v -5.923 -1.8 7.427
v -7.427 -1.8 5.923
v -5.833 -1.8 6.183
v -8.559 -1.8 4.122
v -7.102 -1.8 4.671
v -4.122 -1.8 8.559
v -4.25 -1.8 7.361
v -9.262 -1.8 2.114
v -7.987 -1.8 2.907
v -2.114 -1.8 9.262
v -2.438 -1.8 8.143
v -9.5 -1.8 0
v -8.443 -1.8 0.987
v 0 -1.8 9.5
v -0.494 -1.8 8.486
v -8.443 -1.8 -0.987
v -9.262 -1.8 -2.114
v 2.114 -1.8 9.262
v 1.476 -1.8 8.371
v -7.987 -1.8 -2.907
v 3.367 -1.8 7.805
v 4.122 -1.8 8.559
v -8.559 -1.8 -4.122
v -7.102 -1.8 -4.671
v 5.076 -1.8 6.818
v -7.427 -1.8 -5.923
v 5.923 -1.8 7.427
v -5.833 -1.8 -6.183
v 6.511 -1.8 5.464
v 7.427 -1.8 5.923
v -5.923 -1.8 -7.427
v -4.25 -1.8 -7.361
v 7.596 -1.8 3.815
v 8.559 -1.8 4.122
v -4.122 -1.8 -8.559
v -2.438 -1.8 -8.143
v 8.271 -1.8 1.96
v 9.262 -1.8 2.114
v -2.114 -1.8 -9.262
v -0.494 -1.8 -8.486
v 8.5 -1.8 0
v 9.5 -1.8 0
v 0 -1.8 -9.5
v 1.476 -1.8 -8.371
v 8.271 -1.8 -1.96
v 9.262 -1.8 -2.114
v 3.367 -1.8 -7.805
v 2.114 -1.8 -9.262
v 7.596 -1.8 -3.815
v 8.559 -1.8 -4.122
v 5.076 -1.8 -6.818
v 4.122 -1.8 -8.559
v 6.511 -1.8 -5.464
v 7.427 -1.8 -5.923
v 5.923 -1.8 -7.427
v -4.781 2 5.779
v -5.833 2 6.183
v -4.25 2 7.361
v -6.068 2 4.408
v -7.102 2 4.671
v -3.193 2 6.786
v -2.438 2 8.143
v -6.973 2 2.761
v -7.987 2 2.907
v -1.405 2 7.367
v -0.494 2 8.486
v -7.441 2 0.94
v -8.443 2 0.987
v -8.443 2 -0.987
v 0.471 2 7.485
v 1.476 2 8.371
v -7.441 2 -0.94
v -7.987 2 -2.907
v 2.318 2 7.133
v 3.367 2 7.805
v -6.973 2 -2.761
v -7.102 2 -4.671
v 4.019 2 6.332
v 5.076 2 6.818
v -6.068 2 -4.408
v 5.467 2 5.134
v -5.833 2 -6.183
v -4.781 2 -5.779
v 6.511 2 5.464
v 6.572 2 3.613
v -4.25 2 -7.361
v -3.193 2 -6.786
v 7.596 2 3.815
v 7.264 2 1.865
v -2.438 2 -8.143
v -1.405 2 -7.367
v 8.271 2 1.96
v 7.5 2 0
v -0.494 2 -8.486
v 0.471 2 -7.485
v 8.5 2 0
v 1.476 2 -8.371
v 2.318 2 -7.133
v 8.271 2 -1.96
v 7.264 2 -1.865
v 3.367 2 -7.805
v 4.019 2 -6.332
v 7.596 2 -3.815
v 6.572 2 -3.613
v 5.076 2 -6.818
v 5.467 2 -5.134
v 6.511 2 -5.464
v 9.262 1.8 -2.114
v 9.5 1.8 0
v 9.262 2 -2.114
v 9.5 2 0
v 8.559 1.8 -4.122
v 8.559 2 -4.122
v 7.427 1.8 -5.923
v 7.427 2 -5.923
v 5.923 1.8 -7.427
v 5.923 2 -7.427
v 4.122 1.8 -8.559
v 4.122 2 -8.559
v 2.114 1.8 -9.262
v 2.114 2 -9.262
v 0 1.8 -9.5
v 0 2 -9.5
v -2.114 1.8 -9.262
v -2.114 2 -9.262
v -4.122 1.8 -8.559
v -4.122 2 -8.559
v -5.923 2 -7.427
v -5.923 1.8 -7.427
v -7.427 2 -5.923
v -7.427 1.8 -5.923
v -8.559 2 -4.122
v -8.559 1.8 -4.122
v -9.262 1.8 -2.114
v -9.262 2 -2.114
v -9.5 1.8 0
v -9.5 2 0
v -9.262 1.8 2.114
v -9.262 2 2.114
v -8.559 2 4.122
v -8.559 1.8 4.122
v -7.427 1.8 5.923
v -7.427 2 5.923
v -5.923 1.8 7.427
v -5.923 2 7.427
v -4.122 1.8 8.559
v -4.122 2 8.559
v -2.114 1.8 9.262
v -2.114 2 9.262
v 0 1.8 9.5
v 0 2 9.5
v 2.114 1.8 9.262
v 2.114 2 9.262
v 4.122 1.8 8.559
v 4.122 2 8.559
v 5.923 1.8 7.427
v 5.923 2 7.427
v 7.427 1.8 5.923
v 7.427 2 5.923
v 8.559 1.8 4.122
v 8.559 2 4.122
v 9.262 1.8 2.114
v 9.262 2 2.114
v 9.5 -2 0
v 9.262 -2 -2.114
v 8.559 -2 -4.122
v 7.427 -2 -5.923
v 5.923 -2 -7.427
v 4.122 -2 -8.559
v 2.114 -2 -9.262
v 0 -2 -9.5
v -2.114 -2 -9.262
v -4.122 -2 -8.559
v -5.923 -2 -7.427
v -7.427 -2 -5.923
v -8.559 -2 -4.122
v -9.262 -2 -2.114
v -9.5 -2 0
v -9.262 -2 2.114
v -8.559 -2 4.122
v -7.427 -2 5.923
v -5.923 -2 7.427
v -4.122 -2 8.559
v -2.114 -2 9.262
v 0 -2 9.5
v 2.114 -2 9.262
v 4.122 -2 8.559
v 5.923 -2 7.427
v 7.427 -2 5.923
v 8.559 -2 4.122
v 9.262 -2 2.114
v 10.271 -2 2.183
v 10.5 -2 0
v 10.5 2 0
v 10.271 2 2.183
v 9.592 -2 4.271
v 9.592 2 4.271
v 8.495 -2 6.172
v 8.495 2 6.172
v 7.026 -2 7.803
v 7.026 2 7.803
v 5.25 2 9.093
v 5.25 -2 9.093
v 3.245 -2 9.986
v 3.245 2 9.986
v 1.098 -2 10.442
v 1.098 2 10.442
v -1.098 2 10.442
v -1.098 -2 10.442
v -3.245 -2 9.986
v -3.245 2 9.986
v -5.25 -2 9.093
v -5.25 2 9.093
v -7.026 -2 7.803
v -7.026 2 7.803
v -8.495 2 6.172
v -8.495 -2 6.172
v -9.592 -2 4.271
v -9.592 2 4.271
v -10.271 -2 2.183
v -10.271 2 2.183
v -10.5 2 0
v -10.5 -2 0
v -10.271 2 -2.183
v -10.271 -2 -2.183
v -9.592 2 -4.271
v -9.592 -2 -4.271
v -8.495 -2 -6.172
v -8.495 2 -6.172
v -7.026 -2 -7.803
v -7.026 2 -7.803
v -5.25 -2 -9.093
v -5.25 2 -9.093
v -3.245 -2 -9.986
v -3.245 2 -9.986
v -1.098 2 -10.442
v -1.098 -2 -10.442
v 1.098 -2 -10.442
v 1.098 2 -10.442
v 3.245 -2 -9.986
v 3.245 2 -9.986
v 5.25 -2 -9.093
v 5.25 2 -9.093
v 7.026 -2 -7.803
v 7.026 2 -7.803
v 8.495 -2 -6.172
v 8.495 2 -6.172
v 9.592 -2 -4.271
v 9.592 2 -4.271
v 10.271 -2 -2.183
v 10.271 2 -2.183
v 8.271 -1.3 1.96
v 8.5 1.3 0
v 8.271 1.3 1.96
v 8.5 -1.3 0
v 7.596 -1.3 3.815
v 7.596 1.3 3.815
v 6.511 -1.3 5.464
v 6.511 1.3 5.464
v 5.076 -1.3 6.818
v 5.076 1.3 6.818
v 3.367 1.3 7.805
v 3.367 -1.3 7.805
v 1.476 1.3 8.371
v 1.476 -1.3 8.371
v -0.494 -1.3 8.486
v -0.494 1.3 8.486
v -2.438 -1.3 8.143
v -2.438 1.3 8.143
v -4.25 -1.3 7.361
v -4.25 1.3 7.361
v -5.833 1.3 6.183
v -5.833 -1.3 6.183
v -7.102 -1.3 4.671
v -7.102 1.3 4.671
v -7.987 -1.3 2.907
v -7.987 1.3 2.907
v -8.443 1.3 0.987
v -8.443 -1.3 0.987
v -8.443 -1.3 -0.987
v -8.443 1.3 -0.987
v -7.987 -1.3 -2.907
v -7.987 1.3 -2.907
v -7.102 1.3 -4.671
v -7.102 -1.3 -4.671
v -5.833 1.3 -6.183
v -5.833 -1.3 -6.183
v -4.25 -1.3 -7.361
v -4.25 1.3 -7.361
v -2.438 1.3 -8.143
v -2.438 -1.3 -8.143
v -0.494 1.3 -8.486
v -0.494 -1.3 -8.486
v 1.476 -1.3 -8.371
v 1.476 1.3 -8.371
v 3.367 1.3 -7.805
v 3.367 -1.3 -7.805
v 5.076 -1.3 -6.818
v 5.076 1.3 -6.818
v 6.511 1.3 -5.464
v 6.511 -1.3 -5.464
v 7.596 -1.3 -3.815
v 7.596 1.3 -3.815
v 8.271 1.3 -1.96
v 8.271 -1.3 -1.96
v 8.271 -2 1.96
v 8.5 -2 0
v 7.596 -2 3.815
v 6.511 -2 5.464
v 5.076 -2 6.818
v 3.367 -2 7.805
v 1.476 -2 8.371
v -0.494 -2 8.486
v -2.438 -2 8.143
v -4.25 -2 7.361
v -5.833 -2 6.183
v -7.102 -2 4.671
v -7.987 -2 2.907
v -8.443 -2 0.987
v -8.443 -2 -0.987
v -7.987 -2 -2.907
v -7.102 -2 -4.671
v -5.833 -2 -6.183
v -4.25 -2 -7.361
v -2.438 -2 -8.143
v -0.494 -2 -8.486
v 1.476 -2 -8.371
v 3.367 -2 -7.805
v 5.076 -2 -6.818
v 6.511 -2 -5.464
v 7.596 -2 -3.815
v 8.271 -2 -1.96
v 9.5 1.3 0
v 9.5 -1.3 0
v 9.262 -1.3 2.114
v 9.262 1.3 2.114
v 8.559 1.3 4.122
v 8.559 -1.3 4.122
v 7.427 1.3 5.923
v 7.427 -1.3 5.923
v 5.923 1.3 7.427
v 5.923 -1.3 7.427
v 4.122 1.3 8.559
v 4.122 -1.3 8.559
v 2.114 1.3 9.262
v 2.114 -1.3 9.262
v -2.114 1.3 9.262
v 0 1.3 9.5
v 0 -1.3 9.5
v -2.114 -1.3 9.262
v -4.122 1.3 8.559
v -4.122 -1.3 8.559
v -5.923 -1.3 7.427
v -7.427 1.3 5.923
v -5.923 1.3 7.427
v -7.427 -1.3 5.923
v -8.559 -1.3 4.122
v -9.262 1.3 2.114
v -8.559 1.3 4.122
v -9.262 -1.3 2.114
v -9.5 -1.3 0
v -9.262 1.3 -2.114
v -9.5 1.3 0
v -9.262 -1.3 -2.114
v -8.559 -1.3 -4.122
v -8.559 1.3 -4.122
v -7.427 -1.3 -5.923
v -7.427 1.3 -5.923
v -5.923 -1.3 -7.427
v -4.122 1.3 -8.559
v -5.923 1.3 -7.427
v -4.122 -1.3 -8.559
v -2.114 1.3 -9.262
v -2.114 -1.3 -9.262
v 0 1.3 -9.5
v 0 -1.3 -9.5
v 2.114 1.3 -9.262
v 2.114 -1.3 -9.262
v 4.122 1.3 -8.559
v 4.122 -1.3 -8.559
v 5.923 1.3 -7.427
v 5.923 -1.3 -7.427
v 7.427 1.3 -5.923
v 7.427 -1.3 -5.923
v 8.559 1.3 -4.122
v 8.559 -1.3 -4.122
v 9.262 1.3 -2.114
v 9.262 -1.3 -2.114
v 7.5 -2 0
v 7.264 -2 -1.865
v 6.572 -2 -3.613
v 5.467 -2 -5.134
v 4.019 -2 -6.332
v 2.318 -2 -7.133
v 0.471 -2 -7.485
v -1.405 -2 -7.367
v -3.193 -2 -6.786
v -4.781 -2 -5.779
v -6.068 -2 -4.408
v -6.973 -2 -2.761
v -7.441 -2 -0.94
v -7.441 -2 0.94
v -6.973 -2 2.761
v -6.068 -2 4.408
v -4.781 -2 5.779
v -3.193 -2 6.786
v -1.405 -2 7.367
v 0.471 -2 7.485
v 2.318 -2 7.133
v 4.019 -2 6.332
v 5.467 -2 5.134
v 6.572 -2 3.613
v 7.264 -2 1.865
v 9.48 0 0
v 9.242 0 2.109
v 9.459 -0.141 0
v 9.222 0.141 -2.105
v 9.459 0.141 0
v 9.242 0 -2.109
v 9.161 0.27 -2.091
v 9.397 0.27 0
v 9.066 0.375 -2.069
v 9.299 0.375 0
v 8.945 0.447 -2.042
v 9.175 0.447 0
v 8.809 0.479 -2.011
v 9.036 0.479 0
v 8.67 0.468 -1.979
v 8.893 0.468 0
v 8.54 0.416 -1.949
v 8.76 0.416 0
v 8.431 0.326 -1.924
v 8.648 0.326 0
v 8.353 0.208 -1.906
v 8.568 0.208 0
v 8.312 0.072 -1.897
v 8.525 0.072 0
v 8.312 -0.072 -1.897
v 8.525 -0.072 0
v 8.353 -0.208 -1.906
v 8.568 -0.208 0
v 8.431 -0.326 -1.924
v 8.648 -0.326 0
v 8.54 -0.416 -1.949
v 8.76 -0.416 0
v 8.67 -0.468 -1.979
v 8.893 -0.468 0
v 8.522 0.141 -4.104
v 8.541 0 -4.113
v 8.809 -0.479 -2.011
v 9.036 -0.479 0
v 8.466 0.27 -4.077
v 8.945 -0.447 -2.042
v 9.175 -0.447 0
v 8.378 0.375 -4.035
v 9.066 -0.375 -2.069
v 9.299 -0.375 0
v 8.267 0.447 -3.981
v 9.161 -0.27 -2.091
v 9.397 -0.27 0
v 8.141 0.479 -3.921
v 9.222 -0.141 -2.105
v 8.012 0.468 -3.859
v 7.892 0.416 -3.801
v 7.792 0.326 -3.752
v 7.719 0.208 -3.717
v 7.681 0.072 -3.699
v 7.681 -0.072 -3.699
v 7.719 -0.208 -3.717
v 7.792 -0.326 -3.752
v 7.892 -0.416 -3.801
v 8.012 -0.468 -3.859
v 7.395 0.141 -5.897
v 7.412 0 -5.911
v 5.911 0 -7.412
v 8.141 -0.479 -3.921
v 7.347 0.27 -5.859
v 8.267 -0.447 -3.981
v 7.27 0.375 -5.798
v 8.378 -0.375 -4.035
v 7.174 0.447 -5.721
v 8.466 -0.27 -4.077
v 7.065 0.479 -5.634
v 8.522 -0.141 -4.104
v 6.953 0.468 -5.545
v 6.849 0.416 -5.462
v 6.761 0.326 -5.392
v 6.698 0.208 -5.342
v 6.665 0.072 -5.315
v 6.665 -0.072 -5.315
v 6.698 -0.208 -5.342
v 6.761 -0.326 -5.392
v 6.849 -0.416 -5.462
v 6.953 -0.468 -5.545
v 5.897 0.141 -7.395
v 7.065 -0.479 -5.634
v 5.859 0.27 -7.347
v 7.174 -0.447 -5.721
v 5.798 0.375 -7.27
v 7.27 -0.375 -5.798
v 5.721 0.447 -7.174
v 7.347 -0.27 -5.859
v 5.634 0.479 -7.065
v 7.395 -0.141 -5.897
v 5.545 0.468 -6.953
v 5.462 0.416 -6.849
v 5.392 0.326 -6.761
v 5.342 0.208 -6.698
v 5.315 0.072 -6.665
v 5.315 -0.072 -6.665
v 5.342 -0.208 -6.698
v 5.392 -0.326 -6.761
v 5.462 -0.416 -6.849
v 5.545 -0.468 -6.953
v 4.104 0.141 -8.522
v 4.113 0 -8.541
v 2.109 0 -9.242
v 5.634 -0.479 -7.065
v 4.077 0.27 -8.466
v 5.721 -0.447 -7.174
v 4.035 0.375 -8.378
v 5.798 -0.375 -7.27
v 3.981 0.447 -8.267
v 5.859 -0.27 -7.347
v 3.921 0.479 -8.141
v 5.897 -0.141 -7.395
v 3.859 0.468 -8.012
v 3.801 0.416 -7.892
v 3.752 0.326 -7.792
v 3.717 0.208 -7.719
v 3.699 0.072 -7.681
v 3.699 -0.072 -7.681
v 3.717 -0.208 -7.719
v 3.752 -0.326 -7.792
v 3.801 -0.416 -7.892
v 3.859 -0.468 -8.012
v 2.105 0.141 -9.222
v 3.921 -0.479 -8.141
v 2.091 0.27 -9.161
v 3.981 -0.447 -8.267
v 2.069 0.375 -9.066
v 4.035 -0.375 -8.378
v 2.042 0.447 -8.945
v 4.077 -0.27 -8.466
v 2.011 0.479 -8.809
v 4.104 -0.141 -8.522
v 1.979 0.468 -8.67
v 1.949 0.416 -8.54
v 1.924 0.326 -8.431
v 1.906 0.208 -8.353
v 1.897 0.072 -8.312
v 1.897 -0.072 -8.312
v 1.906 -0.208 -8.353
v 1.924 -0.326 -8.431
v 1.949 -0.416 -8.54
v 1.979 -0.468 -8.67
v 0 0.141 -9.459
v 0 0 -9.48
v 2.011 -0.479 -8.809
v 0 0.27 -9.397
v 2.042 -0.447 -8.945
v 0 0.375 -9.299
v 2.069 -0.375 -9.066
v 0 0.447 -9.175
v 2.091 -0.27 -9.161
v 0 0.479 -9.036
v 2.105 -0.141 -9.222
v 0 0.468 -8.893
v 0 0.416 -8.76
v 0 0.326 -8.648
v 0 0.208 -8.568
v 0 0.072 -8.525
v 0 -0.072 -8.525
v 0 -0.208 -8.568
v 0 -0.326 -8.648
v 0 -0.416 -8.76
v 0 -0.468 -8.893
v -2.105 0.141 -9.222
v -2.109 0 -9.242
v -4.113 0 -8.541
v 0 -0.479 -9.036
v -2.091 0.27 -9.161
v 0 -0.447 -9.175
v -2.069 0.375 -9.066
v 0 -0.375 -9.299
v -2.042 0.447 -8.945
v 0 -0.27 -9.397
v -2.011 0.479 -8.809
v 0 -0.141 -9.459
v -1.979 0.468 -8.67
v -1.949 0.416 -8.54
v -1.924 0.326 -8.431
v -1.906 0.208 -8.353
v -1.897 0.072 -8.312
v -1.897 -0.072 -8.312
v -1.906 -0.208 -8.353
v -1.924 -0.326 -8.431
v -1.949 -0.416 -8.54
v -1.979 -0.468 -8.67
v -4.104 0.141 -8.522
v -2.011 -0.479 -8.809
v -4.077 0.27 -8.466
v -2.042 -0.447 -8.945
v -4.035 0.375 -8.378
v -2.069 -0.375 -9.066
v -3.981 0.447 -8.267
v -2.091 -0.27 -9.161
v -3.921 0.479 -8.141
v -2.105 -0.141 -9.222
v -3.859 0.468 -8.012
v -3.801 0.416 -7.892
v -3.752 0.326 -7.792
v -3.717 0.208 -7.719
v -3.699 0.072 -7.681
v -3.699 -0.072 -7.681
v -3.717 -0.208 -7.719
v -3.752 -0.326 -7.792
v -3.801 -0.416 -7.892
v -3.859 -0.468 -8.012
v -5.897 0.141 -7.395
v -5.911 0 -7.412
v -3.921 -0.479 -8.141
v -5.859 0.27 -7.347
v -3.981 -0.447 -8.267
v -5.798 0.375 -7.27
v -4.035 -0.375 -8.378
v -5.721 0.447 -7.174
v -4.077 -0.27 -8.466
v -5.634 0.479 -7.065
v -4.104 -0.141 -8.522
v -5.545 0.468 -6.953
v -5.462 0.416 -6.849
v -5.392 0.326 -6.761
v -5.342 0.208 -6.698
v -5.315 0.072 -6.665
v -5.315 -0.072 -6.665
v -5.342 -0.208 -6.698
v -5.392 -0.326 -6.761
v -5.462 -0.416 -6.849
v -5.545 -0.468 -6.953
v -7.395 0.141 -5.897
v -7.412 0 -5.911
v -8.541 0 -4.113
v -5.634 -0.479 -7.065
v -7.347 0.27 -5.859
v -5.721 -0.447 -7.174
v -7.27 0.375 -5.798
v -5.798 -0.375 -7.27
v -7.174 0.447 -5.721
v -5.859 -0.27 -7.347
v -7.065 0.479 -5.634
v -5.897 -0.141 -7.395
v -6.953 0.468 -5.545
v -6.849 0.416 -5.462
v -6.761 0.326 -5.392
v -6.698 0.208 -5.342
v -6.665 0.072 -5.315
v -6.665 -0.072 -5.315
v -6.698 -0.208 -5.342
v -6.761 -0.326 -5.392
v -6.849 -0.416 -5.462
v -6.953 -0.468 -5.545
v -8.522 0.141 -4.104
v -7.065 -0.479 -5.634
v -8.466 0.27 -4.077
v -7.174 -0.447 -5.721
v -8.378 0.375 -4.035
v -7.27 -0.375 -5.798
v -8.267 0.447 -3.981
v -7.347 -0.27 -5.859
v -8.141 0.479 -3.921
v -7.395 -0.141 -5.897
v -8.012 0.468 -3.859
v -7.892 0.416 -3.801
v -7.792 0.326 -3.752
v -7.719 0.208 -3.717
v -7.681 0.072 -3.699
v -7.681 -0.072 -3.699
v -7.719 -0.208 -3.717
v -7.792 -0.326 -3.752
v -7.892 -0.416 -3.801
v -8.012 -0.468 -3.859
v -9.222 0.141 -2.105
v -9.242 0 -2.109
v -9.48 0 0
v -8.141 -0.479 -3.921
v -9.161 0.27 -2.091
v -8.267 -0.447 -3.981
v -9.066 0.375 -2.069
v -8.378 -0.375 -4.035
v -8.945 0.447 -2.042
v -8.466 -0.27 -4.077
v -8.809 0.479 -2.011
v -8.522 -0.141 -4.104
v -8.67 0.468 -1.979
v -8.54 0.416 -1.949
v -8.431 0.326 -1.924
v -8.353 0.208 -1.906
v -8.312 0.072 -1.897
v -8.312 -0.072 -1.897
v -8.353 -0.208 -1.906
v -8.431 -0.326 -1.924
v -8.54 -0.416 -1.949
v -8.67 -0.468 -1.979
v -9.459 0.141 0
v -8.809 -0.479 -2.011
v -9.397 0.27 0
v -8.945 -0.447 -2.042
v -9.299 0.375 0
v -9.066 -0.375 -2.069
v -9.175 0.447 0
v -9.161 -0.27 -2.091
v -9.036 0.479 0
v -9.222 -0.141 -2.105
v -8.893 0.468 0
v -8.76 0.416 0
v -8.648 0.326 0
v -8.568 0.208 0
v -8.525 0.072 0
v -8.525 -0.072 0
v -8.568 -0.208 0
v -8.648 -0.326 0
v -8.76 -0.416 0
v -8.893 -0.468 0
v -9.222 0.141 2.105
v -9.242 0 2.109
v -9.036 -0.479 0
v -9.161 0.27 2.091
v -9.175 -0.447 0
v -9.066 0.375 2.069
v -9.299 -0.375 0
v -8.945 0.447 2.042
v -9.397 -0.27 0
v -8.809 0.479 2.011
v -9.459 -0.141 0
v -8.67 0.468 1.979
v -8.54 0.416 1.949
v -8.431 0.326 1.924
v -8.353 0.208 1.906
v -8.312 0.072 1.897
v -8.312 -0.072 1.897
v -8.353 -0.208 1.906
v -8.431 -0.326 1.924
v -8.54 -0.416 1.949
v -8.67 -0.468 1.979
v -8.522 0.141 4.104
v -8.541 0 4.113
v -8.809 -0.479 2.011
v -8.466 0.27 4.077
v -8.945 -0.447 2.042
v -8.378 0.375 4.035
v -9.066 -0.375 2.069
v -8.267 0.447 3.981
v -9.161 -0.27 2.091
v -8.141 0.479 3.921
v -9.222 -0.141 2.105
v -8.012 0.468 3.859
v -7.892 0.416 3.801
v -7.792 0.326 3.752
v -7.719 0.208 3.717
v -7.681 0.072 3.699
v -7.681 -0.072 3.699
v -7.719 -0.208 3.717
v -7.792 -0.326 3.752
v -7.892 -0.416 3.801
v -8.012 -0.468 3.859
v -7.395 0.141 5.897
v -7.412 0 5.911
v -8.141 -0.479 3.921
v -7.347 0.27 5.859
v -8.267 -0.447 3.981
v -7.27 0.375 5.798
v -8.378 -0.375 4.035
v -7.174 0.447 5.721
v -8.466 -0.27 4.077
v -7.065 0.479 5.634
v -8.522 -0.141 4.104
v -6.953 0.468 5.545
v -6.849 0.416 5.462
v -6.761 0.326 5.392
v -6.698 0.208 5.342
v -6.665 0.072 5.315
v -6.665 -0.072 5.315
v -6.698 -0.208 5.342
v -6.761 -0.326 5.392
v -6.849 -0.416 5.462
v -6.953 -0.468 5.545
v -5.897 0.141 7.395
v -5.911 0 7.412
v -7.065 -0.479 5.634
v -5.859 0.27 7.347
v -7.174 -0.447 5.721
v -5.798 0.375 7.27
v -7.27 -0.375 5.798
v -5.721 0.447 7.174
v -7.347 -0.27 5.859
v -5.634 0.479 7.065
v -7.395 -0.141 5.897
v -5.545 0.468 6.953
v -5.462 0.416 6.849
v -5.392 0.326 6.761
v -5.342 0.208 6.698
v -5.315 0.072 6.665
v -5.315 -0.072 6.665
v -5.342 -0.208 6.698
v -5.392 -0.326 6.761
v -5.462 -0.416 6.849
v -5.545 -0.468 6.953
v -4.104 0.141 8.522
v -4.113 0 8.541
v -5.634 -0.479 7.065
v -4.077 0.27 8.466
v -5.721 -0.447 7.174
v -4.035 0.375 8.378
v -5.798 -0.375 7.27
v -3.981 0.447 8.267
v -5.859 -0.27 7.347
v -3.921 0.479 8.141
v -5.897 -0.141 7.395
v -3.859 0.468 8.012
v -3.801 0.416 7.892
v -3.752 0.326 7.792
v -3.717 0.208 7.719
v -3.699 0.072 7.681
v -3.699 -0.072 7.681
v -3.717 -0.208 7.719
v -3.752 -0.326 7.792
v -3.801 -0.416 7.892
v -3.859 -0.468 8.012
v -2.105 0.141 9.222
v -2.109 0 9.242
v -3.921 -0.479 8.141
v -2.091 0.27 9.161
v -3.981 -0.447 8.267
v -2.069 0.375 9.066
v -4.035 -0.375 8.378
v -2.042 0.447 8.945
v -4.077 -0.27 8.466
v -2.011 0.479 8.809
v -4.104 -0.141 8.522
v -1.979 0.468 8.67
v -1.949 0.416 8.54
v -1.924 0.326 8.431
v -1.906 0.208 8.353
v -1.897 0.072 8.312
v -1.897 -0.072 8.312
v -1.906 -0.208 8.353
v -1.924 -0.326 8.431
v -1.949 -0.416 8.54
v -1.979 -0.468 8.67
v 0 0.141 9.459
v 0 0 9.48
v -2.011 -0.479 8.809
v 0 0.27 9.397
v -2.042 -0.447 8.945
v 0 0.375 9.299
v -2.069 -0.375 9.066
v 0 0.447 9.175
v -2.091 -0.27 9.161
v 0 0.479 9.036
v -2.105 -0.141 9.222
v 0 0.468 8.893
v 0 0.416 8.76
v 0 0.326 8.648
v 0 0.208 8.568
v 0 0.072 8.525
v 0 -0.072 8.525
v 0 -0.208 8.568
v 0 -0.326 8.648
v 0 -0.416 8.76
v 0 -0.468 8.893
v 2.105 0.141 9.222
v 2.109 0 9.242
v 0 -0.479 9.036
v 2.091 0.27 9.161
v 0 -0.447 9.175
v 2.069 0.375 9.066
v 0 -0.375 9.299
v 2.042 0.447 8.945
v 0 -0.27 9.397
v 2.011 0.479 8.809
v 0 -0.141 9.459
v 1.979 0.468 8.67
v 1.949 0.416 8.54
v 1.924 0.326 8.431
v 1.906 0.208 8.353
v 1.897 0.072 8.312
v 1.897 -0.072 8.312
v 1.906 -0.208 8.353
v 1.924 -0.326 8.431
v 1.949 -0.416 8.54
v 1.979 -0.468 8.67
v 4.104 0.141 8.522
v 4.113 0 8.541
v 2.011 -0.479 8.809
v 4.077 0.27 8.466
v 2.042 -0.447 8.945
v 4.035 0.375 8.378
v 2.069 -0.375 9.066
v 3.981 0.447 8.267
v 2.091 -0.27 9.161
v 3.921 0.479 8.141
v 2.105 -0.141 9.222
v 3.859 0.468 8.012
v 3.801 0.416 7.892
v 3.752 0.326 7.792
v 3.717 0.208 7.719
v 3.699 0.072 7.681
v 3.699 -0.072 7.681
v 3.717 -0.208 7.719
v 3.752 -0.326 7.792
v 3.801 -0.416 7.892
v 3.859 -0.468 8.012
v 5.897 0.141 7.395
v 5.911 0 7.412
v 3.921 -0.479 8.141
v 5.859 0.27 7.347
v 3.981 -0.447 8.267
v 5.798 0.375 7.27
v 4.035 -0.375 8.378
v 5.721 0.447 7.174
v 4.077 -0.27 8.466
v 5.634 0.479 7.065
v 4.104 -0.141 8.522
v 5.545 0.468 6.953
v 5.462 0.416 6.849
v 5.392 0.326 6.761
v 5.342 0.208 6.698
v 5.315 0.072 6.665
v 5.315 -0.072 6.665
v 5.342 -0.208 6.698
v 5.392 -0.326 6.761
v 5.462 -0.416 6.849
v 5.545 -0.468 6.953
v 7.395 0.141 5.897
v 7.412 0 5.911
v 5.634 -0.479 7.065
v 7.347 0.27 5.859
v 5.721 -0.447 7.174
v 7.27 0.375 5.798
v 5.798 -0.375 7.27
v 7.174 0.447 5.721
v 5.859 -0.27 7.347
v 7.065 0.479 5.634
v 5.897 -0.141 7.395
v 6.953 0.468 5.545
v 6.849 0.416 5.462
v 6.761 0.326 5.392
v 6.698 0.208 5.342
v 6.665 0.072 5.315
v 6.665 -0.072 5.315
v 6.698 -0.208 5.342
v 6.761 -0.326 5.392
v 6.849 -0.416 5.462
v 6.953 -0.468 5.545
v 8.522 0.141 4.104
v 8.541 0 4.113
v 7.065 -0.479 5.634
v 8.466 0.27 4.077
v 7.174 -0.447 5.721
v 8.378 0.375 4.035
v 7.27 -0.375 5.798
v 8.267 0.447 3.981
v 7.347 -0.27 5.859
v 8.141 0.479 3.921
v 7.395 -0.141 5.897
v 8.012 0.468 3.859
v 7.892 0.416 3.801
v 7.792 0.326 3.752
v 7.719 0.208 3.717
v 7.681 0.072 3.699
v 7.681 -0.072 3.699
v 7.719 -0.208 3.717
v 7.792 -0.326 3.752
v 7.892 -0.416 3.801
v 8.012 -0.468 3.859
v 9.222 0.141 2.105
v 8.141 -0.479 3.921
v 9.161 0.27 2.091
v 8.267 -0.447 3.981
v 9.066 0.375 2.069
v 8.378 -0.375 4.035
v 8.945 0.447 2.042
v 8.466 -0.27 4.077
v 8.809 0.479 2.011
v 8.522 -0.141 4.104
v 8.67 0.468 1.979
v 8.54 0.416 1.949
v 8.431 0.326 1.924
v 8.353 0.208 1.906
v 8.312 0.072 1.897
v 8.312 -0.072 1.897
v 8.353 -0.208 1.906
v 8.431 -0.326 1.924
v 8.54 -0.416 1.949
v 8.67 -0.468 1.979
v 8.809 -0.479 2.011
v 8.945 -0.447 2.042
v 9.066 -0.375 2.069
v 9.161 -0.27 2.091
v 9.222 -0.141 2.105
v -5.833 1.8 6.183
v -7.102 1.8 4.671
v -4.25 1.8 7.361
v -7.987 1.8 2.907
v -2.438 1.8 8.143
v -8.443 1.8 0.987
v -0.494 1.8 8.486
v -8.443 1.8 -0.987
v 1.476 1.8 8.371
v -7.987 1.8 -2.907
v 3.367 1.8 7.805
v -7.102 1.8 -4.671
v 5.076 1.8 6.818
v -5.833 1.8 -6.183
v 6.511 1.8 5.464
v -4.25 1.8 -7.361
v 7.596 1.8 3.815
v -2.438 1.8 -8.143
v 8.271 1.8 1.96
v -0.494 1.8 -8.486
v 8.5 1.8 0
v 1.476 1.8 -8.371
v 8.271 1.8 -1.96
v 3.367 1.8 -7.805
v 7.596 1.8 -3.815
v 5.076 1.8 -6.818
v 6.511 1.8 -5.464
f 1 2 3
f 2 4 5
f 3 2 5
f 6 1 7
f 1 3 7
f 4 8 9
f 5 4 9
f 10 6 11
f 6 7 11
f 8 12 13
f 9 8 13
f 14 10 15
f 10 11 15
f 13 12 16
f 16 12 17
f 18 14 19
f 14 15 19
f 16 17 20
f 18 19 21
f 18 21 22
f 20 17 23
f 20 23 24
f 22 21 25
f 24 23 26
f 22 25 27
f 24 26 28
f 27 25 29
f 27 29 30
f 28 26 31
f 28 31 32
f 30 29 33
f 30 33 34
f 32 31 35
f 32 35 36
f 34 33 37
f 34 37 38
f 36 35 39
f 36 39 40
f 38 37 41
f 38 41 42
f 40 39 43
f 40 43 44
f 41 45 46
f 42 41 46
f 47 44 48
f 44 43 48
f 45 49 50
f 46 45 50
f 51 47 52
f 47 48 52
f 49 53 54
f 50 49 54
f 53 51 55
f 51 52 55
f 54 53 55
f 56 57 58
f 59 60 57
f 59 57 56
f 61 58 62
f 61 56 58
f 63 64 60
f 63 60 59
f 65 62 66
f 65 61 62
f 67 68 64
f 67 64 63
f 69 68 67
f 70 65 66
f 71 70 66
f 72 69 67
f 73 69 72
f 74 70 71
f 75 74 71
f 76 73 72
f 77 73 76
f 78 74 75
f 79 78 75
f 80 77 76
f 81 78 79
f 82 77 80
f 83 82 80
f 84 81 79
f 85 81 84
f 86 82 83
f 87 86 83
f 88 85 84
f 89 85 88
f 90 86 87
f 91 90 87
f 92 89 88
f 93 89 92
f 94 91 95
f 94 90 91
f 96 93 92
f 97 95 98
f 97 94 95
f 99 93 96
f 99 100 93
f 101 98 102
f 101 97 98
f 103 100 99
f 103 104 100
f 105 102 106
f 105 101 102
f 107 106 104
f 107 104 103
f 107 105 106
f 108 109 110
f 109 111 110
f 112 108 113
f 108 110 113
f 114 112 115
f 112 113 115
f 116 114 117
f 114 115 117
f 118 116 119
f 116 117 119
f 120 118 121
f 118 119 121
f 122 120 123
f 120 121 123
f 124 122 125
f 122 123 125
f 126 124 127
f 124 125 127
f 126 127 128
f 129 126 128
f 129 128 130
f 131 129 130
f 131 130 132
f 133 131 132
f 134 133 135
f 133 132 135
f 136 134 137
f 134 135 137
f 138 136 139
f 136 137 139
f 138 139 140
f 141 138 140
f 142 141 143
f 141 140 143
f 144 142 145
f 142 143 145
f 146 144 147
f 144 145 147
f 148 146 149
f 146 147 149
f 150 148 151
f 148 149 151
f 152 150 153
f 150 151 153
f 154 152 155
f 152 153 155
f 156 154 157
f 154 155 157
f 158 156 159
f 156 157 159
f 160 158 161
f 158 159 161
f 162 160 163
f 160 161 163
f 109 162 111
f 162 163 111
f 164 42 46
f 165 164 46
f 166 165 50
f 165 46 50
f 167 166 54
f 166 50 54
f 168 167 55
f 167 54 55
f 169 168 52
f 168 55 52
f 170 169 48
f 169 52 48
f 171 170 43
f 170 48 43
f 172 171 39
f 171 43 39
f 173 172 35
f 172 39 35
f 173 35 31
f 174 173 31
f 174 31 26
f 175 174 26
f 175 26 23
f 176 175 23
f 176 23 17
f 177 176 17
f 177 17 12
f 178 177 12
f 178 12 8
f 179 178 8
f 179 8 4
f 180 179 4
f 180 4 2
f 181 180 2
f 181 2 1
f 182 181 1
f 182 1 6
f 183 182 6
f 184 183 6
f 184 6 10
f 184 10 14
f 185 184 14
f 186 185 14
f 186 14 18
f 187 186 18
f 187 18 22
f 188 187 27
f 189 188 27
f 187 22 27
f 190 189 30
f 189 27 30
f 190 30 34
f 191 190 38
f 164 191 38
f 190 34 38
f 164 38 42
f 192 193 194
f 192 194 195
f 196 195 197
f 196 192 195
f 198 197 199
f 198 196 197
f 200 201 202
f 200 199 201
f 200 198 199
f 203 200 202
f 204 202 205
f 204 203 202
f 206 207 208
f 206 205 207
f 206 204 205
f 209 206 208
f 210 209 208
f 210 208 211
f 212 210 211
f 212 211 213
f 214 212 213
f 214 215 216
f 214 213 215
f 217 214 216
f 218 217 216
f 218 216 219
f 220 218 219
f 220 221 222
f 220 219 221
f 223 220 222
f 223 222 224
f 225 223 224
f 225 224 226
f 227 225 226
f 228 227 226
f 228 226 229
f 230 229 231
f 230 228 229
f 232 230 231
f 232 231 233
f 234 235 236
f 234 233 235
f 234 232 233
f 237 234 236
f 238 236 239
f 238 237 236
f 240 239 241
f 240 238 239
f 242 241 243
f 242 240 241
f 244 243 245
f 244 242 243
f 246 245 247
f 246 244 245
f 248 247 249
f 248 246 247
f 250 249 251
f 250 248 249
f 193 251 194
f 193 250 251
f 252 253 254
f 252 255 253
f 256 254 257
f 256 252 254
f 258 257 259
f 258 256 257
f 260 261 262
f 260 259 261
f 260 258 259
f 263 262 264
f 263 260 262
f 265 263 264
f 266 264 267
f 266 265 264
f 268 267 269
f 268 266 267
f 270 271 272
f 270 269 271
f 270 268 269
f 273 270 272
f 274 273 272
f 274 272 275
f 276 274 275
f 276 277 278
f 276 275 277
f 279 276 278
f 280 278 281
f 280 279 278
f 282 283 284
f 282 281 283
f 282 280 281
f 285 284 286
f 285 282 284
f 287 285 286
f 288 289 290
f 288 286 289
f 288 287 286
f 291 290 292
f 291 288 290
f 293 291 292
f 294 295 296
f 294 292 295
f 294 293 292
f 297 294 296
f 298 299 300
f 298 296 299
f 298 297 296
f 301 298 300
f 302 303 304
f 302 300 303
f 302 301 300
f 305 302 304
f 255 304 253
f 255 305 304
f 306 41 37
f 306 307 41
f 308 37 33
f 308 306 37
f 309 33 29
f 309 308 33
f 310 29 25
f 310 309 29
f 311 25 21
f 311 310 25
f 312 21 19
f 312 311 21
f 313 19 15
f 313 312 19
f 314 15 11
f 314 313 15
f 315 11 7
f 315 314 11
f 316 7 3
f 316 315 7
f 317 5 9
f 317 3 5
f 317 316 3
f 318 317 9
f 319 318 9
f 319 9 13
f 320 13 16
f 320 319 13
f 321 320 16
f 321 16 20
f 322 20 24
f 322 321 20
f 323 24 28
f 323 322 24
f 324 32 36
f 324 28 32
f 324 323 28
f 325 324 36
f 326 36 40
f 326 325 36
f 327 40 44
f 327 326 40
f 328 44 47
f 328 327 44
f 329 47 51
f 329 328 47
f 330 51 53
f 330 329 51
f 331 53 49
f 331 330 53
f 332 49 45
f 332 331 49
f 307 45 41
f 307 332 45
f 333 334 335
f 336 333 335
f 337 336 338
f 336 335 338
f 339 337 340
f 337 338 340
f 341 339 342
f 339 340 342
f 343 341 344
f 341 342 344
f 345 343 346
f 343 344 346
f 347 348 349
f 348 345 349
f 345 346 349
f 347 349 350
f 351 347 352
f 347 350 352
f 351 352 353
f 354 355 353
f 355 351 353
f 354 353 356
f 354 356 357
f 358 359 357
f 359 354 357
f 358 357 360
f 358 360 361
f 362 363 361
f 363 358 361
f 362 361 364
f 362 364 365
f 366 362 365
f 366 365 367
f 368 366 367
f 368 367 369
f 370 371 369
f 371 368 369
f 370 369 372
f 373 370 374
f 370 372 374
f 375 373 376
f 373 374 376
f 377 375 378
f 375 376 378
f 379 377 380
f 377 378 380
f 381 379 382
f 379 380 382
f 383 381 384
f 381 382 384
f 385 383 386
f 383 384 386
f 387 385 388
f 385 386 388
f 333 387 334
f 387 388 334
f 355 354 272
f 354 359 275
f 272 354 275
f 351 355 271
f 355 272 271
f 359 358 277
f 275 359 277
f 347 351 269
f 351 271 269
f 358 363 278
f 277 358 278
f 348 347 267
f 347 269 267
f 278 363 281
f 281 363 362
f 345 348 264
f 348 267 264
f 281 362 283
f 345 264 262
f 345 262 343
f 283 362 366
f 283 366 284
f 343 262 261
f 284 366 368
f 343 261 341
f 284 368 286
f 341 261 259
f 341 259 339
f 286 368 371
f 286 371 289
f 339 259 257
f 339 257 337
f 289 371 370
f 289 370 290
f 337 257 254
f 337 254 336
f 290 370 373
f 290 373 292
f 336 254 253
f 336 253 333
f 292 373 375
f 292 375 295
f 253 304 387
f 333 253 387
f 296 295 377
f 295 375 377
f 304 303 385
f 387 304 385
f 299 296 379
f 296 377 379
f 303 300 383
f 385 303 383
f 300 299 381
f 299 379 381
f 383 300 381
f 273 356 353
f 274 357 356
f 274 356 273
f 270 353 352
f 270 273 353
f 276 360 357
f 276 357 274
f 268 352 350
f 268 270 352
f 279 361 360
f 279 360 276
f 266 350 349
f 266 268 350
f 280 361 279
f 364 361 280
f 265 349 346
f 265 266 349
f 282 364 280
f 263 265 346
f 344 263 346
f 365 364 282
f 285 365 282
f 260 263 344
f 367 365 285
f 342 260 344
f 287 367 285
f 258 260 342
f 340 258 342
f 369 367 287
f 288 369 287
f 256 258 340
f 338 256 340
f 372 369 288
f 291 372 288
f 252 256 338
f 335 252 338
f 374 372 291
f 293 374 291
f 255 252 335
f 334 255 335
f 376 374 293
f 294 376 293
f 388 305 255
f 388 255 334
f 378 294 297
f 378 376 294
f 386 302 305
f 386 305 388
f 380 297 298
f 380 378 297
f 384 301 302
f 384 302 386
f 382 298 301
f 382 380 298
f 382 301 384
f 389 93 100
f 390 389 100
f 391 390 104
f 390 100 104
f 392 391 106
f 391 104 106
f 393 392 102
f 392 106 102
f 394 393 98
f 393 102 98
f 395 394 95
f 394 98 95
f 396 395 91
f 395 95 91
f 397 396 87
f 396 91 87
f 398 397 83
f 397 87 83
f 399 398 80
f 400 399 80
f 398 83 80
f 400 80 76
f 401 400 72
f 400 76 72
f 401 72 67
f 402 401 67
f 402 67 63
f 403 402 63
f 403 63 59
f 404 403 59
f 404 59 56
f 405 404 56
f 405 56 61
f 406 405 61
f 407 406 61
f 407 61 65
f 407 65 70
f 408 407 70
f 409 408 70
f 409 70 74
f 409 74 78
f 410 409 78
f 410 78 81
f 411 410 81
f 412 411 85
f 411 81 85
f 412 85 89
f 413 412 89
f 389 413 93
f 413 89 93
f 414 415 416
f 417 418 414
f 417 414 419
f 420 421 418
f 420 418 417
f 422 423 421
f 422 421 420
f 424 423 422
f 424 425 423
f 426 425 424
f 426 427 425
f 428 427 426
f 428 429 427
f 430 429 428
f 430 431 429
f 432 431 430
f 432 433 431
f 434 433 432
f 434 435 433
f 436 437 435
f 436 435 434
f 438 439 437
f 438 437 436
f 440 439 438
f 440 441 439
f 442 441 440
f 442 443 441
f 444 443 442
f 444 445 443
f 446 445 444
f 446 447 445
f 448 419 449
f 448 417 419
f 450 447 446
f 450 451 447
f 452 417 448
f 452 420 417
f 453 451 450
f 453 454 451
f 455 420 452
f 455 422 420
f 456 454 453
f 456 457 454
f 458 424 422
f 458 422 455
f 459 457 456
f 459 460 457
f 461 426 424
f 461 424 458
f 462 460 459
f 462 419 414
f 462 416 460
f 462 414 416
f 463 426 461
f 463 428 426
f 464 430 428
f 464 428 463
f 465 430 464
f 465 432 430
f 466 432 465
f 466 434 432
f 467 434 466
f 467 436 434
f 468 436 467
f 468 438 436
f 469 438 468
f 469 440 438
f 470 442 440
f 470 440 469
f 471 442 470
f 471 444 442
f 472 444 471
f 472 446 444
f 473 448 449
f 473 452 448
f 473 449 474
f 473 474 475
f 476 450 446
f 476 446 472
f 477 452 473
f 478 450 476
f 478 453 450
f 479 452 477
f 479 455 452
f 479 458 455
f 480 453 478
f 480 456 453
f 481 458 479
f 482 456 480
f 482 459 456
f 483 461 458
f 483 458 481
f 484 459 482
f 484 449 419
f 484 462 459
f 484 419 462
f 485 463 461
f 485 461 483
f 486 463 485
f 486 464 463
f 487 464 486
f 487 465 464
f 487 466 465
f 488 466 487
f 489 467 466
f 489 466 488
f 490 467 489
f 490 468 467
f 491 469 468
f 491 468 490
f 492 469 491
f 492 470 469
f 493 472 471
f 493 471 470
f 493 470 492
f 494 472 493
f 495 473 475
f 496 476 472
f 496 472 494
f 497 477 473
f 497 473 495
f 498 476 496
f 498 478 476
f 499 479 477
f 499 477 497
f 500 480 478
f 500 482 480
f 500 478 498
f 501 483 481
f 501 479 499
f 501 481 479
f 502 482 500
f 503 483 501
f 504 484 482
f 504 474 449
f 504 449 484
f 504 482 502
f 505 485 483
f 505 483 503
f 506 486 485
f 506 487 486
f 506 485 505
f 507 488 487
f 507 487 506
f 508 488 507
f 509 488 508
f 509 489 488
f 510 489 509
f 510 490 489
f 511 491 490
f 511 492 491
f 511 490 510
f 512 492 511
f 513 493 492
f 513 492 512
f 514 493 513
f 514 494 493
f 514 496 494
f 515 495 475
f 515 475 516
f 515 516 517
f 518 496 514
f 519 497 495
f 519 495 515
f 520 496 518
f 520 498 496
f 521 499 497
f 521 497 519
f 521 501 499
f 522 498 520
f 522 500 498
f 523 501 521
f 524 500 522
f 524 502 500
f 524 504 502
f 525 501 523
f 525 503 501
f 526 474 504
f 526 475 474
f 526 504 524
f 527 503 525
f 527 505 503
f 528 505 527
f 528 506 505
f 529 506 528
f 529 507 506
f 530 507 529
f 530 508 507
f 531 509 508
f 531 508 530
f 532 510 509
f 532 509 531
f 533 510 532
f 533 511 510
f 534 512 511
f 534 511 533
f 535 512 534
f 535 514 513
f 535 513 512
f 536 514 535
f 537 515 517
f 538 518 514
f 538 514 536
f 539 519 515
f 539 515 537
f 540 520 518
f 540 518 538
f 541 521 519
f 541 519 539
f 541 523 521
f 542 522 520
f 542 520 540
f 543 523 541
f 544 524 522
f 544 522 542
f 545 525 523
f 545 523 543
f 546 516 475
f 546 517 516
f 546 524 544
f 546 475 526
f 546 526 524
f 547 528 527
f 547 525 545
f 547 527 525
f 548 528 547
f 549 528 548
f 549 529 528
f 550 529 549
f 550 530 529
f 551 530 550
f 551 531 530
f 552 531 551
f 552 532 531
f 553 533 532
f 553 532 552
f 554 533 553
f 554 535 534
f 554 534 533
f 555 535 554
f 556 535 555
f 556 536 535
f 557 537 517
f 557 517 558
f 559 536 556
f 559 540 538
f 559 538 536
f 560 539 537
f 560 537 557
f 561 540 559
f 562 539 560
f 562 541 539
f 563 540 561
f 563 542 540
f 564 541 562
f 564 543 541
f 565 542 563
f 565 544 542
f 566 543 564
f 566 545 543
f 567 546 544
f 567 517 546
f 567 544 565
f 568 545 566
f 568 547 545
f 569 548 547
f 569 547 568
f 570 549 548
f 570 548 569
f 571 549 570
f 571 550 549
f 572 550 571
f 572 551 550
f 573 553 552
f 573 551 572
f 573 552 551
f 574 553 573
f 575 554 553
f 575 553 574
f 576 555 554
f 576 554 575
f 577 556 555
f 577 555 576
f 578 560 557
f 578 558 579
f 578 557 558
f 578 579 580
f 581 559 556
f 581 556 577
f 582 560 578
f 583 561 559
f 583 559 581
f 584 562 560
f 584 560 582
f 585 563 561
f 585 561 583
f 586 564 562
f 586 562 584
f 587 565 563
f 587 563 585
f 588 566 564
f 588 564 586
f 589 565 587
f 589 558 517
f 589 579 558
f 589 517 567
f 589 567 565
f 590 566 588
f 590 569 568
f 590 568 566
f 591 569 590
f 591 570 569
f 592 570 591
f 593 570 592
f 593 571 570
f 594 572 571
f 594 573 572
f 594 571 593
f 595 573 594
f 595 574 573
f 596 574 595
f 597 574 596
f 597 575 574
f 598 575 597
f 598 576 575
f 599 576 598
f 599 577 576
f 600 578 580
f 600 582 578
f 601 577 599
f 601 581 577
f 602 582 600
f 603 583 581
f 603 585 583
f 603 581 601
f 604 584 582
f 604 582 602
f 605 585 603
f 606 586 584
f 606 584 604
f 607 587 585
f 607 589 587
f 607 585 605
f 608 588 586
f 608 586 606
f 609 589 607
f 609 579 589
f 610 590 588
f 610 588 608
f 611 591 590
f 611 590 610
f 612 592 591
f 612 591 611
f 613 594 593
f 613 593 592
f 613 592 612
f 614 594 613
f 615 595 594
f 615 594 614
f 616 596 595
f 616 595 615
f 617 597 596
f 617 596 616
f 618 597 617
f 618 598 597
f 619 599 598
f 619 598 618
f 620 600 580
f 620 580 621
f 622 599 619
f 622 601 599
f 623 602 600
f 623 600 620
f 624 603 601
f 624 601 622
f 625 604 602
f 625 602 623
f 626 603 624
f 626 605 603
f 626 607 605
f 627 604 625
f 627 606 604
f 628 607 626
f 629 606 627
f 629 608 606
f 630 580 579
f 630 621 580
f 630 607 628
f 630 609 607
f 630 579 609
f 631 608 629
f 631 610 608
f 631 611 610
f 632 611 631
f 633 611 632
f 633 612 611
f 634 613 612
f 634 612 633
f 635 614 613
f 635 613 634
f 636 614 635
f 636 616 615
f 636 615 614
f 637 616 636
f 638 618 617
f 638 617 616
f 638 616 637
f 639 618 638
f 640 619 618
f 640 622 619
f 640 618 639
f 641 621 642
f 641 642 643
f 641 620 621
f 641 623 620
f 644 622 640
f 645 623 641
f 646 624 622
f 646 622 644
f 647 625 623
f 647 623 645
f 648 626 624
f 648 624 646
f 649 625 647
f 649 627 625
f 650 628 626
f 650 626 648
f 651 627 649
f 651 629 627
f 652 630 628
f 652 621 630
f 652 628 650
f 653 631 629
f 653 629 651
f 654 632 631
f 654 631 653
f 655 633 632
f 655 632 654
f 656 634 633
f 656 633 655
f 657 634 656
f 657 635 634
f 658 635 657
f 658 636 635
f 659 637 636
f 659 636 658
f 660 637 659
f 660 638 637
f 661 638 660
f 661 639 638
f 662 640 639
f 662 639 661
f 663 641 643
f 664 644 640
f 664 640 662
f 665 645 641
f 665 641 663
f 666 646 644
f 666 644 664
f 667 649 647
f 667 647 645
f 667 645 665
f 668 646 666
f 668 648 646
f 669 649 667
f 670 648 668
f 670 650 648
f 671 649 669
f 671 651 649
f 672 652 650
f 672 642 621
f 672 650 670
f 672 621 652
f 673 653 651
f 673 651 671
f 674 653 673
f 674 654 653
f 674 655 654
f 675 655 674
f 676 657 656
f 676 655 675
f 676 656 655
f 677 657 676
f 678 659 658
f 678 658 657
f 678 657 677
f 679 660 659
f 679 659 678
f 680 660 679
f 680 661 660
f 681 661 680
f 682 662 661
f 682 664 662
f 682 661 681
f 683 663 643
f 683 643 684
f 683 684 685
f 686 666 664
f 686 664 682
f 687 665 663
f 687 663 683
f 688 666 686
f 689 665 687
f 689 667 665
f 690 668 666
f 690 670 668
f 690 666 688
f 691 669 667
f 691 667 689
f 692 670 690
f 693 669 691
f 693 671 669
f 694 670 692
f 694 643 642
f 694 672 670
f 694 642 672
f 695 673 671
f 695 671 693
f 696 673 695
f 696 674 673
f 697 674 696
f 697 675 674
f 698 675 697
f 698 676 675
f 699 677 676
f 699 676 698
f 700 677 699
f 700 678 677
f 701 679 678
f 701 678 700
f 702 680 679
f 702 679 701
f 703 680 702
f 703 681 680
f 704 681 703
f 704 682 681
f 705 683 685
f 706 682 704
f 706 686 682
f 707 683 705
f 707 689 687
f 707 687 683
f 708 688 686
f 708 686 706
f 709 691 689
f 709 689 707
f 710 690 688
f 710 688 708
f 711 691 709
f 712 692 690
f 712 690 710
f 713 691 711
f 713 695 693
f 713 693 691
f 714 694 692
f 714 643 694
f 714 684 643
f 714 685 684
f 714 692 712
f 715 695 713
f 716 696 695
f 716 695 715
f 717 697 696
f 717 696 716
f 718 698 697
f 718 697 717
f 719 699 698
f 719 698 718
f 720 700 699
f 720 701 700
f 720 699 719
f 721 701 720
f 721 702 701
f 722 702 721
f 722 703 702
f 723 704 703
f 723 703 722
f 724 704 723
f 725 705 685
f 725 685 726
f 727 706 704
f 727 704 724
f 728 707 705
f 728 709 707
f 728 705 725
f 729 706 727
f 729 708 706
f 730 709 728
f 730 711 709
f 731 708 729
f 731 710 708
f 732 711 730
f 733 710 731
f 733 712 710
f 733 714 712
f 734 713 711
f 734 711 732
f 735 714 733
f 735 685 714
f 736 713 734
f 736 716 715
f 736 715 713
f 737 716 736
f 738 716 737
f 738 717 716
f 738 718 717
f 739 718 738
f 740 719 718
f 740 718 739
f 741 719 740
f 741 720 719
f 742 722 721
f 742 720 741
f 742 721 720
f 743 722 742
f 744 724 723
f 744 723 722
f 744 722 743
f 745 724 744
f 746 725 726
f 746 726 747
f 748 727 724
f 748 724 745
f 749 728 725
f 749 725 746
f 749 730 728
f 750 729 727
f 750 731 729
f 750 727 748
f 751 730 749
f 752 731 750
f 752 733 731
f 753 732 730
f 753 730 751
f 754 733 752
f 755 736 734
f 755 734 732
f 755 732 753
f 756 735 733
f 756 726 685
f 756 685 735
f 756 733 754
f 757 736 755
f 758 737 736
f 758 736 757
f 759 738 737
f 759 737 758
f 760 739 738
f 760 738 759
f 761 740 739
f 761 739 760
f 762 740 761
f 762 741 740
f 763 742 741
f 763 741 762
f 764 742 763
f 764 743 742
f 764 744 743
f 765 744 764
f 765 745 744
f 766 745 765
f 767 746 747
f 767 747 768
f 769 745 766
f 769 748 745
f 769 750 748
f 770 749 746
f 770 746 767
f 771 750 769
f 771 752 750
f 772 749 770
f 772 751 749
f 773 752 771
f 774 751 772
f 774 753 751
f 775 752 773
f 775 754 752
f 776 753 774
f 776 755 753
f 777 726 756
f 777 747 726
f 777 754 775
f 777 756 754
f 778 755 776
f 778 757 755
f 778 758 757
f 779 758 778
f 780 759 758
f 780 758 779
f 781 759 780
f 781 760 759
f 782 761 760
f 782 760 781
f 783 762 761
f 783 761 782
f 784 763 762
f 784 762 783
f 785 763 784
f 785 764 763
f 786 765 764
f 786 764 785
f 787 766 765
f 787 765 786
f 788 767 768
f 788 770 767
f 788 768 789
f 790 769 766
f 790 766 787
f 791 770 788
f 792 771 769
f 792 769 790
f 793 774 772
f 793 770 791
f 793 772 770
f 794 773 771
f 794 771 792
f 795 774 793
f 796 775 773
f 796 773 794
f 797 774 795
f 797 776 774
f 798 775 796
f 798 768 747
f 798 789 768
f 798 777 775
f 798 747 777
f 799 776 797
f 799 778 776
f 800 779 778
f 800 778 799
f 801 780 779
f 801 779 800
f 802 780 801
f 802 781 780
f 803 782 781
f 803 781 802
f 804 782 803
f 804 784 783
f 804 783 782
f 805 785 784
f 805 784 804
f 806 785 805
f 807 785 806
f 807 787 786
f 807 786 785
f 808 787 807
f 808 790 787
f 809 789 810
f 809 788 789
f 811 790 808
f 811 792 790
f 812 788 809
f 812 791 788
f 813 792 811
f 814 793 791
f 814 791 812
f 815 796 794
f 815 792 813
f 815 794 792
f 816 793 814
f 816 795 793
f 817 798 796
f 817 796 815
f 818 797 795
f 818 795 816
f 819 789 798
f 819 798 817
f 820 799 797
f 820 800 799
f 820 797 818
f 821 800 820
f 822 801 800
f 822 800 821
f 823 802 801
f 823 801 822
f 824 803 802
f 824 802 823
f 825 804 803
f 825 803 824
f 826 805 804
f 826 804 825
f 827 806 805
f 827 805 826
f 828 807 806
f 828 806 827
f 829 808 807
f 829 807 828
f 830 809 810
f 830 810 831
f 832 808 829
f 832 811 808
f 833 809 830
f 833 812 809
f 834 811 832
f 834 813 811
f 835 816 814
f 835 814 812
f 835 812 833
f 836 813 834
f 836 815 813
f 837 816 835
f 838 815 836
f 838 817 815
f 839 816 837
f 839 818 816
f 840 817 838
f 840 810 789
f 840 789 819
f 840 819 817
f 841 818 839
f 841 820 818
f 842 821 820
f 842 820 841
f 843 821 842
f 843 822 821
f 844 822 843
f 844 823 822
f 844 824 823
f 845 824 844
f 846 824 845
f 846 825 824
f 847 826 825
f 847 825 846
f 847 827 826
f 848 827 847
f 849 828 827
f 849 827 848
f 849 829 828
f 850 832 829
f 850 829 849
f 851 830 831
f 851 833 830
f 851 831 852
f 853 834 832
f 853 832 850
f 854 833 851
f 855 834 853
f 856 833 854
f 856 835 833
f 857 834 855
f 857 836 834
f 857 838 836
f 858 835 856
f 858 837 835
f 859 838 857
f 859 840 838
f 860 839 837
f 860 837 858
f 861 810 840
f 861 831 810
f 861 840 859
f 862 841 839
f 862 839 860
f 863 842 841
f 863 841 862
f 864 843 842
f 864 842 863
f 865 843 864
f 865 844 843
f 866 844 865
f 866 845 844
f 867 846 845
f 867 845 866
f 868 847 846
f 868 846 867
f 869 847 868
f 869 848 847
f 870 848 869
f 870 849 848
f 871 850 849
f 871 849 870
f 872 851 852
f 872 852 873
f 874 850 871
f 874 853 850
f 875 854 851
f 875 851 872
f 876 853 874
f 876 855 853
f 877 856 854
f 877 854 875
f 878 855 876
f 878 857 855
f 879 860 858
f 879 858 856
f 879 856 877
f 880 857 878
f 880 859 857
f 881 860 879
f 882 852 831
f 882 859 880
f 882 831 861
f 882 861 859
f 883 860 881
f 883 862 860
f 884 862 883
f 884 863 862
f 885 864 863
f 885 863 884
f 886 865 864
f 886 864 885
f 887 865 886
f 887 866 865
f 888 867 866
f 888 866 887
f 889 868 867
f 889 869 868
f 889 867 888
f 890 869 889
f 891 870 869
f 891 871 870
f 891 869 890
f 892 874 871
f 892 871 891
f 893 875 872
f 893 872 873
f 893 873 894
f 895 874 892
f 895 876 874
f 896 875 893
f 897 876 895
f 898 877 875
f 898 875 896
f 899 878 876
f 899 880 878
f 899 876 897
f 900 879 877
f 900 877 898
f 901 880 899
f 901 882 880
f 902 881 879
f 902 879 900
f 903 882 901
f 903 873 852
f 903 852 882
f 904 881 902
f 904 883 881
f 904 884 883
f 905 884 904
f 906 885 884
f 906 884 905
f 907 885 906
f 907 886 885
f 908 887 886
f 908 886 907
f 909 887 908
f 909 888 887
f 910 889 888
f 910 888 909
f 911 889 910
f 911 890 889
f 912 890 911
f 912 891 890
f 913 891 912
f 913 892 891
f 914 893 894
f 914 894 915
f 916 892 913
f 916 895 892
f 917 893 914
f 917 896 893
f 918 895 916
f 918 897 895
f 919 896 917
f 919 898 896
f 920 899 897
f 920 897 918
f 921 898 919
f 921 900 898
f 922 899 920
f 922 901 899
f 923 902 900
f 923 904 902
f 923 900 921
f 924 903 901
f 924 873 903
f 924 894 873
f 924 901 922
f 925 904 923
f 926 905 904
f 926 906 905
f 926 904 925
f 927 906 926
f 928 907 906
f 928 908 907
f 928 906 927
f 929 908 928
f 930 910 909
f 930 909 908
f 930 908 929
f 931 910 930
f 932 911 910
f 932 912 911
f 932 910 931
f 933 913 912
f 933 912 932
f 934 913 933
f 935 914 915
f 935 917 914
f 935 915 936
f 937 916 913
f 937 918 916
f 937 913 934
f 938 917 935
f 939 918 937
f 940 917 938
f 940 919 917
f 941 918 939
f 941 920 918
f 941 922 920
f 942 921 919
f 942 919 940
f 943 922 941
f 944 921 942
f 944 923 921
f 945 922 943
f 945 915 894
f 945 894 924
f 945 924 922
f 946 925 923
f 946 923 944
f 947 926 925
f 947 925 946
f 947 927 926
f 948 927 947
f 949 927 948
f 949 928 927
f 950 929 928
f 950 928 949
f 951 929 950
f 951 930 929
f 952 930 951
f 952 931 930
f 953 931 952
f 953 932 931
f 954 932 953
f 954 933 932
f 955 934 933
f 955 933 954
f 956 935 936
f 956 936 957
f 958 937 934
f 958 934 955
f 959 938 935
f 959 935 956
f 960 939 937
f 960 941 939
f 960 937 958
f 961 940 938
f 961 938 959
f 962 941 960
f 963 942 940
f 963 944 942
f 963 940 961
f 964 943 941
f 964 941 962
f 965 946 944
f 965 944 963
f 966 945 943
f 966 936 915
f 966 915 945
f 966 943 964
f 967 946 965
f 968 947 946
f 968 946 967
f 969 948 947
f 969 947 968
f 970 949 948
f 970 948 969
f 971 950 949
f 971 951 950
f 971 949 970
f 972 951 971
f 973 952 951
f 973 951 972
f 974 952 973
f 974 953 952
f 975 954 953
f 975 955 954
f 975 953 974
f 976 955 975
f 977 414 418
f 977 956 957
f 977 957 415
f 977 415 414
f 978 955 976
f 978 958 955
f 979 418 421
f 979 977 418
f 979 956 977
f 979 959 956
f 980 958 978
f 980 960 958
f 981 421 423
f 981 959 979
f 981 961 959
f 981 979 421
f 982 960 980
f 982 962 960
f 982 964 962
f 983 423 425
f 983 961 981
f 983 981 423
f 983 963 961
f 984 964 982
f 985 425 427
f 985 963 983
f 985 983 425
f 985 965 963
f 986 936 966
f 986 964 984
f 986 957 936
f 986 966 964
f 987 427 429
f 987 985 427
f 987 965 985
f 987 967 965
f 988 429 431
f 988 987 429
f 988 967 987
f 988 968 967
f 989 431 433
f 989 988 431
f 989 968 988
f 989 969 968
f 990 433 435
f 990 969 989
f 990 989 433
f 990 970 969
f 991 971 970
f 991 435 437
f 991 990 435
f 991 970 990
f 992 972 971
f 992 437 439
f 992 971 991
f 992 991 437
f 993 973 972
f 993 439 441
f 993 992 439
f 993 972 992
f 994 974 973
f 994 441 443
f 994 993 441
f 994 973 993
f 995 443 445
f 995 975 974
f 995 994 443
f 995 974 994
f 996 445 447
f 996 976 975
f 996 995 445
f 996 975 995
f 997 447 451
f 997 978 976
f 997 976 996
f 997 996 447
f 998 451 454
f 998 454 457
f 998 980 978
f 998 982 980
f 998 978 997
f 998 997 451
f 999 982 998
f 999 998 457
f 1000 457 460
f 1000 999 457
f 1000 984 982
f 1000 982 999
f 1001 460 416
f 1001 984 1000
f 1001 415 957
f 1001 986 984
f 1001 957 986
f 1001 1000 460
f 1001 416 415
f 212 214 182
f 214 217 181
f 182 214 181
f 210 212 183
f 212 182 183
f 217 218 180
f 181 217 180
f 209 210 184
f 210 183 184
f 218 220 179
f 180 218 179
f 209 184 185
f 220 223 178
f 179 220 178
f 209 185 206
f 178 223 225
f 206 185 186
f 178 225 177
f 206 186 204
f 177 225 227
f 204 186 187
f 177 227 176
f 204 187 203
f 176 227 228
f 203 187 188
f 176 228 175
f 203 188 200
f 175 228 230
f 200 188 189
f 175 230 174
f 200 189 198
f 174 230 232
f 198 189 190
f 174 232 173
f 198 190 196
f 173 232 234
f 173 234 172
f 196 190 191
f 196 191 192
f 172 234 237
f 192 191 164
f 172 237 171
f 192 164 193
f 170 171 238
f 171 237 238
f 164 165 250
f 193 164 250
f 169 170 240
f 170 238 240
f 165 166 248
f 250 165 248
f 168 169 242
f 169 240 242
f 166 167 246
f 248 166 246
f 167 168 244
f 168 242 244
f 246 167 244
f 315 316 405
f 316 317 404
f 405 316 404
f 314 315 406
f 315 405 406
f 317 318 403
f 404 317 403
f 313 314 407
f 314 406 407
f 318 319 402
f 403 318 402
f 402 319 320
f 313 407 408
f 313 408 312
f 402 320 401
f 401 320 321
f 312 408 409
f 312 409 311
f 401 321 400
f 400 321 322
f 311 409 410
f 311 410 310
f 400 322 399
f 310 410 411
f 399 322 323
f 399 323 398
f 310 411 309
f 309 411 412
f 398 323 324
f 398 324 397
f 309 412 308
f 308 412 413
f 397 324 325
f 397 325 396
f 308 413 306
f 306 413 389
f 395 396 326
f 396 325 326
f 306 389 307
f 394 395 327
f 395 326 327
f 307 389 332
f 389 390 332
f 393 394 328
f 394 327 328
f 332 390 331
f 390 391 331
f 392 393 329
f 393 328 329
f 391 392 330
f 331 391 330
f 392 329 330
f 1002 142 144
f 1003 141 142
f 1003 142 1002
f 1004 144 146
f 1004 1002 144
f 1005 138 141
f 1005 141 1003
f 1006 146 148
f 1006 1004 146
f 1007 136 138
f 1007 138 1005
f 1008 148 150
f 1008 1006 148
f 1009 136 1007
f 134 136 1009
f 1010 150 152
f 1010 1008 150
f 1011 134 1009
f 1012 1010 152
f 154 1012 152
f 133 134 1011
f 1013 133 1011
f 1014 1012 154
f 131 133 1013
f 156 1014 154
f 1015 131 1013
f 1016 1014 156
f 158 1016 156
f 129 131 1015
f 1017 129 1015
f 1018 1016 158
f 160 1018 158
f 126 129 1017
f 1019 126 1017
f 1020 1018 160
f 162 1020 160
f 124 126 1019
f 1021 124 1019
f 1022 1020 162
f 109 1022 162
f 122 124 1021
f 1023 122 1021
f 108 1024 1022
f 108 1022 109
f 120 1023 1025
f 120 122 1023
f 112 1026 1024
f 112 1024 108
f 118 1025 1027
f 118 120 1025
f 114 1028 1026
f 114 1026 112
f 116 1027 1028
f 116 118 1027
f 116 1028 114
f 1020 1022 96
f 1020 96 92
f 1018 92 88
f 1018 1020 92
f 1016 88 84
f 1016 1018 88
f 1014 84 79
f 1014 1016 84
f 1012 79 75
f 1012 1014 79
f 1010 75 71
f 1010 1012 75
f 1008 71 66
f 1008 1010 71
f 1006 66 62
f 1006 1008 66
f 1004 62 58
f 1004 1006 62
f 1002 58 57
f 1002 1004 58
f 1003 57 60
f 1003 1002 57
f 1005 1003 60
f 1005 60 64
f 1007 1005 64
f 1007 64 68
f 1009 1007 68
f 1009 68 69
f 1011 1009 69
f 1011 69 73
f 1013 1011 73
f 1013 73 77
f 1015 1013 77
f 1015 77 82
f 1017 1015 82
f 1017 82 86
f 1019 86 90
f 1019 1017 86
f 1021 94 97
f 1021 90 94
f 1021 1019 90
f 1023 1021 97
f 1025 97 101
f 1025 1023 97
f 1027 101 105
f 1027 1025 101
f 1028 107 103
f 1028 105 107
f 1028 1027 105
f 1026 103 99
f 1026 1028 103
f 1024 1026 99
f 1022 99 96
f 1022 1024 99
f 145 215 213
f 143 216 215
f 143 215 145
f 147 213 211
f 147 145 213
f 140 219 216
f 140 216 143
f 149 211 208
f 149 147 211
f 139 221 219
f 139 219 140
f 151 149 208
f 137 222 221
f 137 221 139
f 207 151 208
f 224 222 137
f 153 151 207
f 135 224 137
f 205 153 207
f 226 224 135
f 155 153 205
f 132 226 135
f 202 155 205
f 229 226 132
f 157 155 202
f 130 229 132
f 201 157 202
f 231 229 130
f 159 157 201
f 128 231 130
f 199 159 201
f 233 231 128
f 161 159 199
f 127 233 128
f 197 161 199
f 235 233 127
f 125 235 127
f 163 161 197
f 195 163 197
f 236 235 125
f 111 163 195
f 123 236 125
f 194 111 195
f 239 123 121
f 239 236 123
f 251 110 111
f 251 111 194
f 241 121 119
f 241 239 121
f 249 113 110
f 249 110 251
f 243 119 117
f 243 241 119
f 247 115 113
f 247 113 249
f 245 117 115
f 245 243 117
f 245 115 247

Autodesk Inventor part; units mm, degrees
ref_plane "YZ Plane" through (0, 0, 0) normal (1, 0, 0) x (0, 1, 0)
ref_plane "XZ Plane" through (0, 0, 0) normal (0, 1, 0) x (-1, 0, 0)
ref_plane "XY Plane" through (0, 0, 0) normal (0, 0, 1) x (1, 0, 0)
sketch "Sketch1" plane through (0, 0, 0) normal (0, 0, 1) x (1, 0, 0)
  line L0 (0, 0) -> (0, 10) construction
  line L1 (0, 0) -> (10, 0) construction
  line L2 (7.5, 2) -> (8.5, 2)
  line L3 (8.5, 2) -> (8.5, -2)
  line L4 (8.5, -2) -> (7.5, -2)
  line L5 (7.5, -2) -> (7.5, 2)
  line L6 (8.5, 1.8) -> (9.5, 1.8)
  line L7 (9.5, 1.8) -> (9.5, -1.8)
  line L8 (9.5, -1.8) -> (8.5, -1.8)
  line L9 (8.5, -1.8) -> (8.5, 1.8)
  line L10 (9.5, 2) -> (10.5, 2)
  line L11 (10.5, 2) -> (10.5, -2)
  line L12 (10.5, -2) -> (9.5, -2)
  line L13 (9.5, -2) -> (9.5, 2)
  line L14 (8.5, 1.3) -> (9.5, 1.3)
  line L15 (8.5, -1.3) -> (9.5, -1.3)
  line L16 (8.52, 4.2678) -> (8.52, -4.334) construction
  line L17 (9.48, 3.8746) -> (9.48, -4.06) construction
  circle A0 centre (9, 0) radius 0.48
  point P0 (8.5, 1.3)
  dimension "d0" = 10
  dimension "d1" = 90
  dimension "d2" = 1
  dimension "d3" = 4
  dimension "d5" = 3.6
  dimension "d6" = 0.2
  dimension "d7" = 2
  dimension "d8" = 1
  dimension "d9" = 4
  dimension "d10" = 7.5
  dimension "d11" = 2
  dimension "d13" = 10.5
  dimension "d14" = 0.5
  dimension "d15" = 0.5
  dimension "d16" = 0.02
  dimension "d17" = 0.02
revolve "Revolution1" add sketch "Sketch1" angle 360 about axis through (0, 0, 0) along (0, 1, 0) contours L2 L3 L4 L5 | L6 L7 L14 L3 | L13 L10 L11 L12 L7 | L3 L15 L7 L8 | A0
equation "\"d5\" = d9 - 2 * d6"
equation "\"d7\" = 0.5 * d3"
equation "\"d8\" = d2"
equation "\"d9\" = d3"
equation "\"d11\" = d7"
equation "\"d17\" = d16"
properties part number "6702ZZ-bearing-15x21x4"
